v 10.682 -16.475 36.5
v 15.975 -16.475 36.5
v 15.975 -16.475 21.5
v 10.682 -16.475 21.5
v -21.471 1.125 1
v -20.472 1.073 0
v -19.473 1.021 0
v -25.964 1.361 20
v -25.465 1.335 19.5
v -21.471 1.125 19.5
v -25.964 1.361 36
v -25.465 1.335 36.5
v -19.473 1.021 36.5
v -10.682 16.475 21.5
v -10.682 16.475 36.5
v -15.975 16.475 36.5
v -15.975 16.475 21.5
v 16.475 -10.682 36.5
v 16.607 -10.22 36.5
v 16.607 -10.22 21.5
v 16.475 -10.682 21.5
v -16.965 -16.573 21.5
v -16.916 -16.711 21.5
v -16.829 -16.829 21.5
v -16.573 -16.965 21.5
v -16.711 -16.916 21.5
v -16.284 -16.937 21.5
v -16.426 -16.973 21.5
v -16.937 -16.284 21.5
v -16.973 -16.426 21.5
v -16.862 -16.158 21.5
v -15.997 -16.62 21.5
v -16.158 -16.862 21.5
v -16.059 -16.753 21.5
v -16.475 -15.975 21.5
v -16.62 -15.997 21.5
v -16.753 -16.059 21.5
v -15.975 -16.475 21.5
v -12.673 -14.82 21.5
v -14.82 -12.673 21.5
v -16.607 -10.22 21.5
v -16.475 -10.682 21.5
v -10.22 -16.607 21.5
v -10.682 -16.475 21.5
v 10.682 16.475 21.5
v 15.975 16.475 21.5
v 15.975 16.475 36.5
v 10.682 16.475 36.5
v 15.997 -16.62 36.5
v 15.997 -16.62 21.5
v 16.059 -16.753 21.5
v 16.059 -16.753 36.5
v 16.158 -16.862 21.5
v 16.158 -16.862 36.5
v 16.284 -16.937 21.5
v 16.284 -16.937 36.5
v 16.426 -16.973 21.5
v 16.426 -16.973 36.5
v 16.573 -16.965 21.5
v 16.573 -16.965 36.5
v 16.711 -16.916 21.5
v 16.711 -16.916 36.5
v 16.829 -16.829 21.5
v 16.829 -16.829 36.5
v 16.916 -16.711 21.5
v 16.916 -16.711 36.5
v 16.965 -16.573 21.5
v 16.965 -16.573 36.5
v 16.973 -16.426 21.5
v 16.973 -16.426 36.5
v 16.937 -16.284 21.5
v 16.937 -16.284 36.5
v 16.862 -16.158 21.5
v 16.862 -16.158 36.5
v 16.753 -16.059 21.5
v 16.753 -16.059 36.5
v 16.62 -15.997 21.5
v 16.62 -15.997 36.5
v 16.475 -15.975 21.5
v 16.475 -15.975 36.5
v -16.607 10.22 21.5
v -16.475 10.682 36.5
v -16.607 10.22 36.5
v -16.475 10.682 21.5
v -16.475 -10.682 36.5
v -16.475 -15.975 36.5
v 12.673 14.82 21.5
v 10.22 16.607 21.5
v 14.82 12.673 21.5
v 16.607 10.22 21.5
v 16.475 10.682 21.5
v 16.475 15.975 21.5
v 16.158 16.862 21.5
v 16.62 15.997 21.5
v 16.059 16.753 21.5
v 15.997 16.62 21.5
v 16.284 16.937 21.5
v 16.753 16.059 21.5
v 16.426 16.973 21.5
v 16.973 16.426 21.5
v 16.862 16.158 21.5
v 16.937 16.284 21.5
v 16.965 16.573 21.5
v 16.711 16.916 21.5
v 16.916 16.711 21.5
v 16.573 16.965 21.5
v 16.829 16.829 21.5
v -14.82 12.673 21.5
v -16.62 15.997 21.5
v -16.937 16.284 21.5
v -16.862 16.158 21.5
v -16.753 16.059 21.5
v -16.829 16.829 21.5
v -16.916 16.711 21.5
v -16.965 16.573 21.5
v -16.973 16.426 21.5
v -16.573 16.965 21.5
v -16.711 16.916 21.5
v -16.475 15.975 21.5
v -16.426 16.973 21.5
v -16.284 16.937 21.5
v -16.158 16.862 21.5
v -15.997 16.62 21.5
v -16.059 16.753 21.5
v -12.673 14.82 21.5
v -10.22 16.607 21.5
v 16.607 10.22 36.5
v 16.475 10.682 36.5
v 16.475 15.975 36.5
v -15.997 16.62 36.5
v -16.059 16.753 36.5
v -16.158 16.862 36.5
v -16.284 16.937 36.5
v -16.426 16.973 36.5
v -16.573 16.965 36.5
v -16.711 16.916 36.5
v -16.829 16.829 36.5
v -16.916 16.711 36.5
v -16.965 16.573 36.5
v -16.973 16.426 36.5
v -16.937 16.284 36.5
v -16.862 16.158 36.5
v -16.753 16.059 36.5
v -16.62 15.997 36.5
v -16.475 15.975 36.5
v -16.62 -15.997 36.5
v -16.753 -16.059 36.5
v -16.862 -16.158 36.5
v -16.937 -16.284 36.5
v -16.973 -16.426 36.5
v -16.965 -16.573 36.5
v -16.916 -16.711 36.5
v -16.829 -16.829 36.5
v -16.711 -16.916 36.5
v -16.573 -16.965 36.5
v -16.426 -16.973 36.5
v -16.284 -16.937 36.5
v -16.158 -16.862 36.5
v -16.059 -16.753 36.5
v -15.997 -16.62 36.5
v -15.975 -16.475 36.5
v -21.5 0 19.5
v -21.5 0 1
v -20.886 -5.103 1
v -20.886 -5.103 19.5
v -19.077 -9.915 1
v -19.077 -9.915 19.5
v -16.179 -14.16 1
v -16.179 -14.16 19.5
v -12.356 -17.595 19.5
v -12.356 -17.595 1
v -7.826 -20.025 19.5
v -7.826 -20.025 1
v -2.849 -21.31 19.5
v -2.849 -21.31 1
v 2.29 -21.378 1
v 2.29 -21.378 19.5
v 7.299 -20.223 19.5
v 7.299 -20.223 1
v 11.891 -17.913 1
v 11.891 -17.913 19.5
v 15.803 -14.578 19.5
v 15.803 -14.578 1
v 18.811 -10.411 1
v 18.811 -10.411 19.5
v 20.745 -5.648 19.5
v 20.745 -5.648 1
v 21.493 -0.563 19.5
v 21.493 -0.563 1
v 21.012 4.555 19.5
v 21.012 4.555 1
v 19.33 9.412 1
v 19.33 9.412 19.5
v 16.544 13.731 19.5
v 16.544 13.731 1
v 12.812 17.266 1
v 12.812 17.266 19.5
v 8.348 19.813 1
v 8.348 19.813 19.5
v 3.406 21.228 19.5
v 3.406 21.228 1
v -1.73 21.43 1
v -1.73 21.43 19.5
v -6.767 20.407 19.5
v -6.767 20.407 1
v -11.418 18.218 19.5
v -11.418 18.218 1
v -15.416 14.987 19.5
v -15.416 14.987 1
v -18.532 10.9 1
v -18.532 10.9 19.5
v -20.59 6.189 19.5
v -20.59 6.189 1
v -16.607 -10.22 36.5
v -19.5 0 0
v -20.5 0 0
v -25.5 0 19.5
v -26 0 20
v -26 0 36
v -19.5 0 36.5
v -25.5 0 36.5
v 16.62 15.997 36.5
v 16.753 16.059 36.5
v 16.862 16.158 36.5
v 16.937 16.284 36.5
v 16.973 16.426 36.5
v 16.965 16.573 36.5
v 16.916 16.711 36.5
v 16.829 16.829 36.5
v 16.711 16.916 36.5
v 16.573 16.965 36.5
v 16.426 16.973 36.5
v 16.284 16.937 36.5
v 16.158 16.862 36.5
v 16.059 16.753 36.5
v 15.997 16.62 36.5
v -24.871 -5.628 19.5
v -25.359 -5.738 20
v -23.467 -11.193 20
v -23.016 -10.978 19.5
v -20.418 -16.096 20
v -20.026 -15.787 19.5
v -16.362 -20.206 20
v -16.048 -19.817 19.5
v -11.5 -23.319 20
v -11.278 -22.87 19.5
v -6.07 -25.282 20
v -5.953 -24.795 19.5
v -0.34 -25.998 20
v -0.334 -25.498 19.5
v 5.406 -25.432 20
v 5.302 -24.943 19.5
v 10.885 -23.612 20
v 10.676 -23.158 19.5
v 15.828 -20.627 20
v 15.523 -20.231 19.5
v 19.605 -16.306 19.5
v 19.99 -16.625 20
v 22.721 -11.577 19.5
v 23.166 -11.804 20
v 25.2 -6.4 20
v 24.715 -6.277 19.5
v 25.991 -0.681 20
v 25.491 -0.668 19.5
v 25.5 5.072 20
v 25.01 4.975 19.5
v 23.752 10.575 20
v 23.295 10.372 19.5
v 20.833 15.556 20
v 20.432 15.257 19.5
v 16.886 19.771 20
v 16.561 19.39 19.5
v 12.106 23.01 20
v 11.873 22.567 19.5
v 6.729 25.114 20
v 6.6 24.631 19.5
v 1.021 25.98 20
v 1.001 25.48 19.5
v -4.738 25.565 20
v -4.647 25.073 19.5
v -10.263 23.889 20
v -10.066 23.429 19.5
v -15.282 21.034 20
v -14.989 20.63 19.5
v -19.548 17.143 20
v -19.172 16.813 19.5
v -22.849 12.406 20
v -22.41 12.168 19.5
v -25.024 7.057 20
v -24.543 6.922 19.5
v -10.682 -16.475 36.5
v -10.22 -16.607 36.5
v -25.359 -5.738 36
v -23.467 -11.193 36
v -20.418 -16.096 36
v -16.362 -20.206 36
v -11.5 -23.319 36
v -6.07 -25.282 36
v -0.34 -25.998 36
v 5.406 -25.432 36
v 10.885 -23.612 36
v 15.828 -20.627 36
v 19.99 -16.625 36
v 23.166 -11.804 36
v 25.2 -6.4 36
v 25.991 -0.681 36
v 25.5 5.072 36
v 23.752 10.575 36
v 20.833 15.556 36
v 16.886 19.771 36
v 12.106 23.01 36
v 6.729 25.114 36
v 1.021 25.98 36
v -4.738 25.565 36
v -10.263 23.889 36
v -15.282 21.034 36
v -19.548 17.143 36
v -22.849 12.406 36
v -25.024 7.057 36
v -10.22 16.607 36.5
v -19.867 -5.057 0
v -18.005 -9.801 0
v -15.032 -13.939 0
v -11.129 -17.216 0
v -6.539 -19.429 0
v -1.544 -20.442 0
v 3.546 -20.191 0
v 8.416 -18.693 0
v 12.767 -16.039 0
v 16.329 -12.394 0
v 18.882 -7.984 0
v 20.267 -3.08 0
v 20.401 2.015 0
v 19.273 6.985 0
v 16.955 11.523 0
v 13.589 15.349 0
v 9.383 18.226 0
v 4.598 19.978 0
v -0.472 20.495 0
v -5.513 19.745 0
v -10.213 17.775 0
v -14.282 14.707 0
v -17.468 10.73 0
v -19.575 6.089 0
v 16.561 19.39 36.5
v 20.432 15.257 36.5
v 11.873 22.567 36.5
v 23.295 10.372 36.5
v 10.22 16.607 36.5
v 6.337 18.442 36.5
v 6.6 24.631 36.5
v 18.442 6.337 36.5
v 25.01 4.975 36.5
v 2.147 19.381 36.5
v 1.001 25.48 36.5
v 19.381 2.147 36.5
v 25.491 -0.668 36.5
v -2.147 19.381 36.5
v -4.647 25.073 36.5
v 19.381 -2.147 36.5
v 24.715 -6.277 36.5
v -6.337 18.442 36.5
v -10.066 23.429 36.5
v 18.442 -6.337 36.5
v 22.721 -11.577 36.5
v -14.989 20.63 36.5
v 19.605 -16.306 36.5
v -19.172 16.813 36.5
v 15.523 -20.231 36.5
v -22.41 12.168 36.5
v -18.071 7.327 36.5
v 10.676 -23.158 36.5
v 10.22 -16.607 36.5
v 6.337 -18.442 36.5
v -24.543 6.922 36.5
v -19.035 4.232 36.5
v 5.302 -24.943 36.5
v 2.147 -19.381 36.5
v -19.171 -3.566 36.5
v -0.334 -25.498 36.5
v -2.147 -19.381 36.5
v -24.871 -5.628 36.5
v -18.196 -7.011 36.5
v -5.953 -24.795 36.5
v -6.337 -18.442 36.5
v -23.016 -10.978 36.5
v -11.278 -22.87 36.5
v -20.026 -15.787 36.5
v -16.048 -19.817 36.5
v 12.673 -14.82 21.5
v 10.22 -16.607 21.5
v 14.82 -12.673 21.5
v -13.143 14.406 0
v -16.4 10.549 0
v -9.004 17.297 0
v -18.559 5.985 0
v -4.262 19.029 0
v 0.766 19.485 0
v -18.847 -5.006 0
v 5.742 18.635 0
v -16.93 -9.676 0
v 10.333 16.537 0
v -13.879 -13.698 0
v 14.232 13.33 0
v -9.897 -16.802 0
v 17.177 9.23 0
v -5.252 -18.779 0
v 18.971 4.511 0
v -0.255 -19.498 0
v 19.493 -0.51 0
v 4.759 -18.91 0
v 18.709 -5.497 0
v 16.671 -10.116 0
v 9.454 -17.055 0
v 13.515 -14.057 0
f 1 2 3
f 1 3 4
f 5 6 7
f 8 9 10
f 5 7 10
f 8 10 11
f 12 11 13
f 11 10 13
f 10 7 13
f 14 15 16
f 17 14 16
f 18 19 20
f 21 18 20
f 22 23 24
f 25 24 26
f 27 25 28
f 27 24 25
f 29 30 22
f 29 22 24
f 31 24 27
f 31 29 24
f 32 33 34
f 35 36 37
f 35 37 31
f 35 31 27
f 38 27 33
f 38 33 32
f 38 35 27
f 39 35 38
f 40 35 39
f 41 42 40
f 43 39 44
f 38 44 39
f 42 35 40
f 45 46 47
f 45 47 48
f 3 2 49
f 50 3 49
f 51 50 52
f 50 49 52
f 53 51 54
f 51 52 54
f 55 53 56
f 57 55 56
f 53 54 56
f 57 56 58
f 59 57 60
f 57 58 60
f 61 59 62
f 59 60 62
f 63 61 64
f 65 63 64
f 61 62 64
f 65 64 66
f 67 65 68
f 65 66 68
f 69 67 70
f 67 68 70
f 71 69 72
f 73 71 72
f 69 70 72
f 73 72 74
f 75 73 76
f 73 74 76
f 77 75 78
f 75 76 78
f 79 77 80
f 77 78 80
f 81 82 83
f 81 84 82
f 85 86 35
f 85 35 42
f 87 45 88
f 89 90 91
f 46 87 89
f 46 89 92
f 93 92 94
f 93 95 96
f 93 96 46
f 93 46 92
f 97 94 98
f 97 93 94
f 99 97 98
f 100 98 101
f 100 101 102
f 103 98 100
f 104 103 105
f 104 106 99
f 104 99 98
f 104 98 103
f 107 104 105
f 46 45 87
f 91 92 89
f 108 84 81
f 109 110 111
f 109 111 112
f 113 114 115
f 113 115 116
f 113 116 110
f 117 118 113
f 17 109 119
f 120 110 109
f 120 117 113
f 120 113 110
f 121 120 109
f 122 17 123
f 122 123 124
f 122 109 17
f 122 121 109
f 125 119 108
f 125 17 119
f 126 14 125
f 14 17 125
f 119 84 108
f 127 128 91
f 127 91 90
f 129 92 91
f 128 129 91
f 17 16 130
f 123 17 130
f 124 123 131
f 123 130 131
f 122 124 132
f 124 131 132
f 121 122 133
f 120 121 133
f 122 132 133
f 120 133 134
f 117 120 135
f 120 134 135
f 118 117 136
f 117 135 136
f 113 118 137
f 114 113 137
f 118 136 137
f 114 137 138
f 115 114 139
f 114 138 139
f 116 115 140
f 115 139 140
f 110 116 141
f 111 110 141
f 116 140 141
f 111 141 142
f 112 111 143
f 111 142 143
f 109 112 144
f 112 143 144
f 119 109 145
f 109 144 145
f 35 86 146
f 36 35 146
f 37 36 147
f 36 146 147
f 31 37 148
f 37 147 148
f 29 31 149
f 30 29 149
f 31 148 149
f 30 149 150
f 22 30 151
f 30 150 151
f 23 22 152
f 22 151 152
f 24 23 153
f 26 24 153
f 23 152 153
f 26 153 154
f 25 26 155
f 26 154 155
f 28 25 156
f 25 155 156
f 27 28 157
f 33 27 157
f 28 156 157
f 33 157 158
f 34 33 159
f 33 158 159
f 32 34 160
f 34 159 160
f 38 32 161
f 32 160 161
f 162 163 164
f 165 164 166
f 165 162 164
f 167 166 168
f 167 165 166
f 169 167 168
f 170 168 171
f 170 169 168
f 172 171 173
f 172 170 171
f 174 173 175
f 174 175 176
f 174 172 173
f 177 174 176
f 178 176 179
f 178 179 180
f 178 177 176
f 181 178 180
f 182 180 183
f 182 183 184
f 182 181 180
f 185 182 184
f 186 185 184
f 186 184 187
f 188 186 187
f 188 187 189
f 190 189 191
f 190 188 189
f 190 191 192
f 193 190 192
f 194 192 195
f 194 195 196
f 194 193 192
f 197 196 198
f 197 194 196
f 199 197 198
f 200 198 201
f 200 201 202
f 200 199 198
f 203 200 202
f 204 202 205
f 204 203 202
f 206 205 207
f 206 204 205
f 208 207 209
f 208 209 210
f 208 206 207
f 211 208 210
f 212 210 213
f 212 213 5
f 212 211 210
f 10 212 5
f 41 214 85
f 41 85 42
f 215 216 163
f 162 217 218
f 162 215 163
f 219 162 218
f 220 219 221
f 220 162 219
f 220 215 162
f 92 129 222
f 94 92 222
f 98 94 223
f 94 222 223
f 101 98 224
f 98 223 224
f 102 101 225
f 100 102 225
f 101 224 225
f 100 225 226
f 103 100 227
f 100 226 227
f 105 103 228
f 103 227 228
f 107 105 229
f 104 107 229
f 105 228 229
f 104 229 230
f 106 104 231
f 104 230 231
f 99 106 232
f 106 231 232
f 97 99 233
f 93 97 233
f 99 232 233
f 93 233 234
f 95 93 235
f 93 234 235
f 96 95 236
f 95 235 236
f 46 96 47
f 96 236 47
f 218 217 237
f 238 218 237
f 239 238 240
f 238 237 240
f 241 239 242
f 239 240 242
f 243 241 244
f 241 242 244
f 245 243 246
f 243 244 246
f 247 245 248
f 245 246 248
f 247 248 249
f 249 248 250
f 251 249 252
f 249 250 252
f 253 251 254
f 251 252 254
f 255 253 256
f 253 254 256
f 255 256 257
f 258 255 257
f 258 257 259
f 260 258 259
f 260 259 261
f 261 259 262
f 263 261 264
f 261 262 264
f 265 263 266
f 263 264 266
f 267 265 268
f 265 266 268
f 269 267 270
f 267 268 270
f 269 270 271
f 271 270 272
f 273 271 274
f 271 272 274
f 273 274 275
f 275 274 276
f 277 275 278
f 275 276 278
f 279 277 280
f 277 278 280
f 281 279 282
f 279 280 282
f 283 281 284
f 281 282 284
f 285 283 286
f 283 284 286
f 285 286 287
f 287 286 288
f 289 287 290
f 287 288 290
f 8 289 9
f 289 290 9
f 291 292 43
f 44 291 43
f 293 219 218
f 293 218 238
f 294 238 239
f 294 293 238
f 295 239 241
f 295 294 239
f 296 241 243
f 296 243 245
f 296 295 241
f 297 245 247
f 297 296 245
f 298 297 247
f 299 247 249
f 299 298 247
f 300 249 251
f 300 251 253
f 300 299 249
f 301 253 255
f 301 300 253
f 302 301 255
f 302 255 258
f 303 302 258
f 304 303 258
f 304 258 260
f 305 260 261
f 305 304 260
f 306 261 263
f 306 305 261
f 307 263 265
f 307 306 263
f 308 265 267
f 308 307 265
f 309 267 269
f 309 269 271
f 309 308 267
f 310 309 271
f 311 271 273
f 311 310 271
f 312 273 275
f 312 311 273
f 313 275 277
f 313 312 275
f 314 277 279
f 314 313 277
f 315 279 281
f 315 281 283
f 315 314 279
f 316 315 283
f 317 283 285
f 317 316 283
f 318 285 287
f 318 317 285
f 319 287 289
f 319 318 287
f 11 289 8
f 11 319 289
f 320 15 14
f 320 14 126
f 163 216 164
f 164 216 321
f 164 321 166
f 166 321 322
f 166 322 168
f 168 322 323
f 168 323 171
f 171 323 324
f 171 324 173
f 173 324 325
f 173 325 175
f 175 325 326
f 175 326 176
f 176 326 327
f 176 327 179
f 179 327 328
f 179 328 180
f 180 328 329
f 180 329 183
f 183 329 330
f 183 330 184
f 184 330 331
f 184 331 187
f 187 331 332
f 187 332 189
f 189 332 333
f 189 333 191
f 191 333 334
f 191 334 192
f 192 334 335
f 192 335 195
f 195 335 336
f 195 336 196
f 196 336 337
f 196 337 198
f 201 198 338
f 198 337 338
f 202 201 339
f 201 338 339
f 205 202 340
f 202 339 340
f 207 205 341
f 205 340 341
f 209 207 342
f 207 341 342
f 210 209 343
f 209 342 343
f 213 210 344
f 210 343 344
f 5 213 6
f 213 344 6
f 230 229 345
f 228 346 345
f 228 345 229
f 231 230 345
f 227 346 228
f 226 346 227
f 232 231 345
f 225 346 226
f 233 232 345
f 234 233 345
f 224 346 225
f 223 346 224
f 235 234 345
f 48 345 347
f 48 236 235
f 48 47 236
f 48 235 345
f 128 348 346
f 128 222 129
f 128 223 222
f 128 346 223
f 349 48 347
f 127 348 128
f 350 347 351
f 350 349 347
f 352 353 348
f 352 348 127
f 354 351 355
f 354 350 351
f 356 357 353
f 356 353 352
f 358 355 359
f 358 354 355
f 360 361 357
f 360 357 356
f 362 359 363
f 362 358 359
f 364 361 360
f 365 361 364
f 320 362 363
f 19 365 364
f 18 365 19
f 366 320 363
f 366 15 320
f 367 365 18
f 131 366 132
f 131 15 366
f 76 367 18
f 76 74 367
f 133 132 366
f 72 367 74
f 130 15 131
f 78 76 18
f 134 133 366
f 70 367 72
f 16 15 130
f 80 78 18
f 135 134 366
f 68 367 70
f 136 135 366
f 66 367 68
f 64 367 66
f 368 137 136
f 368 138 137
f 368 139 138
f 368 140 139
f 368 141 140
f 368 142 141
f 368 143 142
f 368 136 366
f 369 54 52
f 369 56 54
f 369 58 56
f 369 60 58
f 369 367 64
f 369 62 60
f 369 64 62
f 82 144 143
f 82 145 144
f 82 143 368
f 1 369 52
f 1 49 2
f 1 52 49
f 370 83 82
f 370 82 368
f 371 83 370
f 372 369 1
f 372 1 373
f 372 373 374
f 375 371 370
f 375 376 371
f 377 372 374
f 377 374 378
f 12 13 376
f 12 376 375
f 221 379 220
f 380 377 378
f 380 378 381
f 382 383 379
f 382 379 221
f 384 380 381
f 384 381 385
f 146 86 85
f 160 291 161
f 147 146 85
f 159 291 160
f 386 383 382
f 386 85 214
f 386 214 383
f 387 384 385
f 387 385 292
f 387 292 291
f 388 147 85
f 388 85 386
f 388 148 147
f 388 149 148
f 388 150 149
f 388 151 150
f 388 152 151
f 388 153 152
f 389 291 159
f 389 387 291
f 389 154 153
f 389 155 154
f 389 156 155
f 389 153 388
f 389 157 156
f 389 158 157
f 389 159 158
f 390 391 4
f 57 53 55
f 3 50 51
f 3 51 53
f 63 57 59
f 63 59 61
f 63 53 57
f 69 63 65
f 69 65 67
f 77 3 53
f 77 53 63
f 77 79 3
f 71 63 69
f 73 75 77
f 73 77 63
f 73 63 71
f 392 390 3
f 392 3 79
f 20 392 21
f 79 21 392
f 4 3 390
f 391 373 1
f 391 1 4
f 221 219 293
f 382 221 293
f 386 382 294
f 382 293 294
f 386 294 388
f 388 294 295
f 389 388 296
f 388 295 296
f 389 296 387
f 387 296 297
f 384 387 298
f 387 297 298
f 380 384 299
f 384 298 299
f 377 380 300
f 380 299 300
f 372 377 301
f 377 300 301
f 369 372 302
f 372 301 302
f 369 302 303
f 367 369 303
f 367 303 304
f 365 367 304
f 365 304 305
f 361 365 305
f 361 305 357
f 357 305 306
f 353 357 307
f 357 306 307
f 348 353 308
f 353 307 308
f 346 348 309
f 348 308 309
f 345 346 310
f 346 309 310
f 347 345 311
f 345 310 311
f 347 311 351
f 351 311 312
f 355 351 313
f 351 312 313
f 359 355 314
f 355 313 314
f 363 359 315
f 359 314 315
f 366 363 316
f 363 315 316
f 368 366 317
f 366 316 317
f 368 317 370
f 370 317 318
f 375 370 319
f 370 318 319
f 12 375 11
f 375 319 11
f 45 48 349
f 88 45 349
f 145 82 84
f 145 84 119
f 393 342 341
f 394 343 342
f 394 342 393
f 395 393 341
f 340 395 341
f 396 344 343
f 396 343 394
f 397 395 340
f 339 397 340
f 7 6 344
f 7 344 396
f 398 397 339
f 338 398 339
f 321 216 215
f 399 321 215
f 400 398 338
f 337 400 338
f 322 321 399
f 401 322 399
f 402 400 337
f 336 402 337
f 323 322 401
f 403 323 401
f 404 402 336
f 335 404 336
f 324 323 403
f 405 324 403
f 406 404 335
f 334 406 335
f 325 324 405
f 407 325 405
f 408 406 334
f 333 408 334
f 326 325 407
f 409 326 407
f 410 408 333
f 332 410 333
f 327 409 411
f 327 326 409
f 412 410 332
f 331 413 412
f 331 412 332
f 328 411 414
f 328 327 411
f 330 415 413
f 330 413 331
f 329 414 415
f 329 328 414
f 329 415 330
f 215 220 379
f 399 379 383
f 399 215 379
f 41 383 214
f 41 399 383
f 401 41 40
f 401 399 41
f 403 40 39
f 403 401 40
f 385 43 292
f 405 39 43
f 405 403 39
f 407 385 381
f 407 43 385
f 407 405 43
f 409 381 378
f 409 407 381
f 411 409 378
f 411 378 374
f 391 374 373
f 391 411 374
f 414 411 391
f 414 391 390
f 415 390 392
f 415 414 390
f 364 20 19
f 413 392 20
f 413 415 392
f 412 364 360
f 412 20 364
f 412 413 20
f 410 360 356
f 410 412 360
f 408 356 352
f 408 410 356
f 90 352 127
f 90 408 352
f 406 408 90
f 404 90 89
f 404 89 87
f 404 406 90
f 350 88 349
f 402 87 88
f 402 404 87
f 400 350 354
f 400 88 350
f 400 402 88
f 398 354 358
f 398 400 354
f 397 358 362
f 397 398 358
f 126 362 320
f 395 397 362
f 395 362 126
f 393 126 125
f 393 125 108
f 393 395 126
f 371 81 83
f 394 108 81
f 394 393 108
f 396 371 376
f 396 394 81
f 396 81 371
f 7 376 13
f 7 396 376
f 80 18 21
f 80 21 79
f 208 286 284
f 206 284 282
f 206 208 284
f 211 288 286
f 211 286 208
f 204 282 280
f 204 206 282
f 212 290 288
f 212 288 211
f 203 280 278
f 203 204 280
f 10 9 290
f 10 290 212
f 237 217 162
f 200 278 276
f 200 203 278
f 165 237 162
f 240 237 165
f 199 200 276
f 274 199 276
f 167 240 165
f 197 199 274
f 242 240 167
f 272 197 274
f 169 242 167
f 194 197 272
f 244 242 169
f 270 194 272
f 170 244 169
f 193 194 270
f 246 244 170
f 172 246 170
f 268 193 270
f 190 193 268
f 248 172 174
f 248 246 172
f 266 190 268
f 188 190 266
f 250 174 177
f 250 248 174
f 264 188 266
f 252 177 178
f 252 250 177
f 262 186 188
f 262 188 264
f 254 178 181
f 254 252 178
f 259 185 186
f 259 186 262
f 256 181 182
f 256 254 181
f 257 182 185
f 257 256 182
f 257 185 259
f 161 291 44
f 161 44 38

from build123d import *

# Parameters (mm, degrees)
REVOLUTION_ANGLE = -357
SKETCH002_R      = 19.5
POCKET_DEPTH     = 36.501
POCKET001_DEPTH  = 15
CHAMFER_SIZE     = 0.25
CHAMFER001_SIZE  = 0.5
CHAMFER002_SIZE  = 0.5
CHAMFER003_SIZE  = 1


with BuildPart() as part:
    # Sketch → Revolution (revolve)
    with BuildSketch(Plane(origin=(0, 0, 0), x_dir=(0, 0, -1), z_dir=(0, -1, 0))):
        Polygon((-36.5, 0), (0, 0), (0, -21.5), (-19.5, -21.5), (-19.5, -26), (-36.5, -26), align=None)
    revolve(axis=Axis((0, 0, 0), (0, 0, -1)), revolution_arc=REVOLUTION_ANGLE)

    # Sketch002 → Pocket (cut, through all)
    with BuildSketch(Plane.XY):
        Circle(SKETCH002_R)
    extrude(amount=POCKET_DEPTH, mode=Mode.SUBTRACT)

    # Sketch001 → Pocket001 (cut)
    with BuildSketch(Plane.XY.offset(36.5)):
        with BuildLine():
            ThreePointArc((-15.975, 16.475), (-16.828553, 16.828553), (-16.475, 15.975))
            Line((-16.475, -15.975), (-16.475, 15.975))
            ThreePointArc((-16.475, -15.975), (-16.828553, -16.828553), (-15.975, -16.475))
            Line((15.975, -16.475), (-15.975, -16.475))
            ThreePointArc((15.975, -16.475), (16.828553, -16.828553), (16.475, -15.975))
            Line((16.475, 15.975), (16.475, -15.975))
            ThreePointArc((16.475, 15.975), (16.828553, 16.828553), (15.975, 16.475))
            Line((15.975, 16.475), (-15.975, 16.475))
        make_face()
    extrude(amount=-POCKET001_DEPTH, mode=Mode.SUBTRACT)

    # Chamfer
    chamfer_edges = [part.edges().sort_by_distance(p)[0] for p in [
        (-16.475, -10.431892, 29),
        (-10.431892, -16.475, 29),
        (10.431892, -16.475, 29),
        (16.475, -10.431892, 29),
        (-16.475, 10.431892, 29),
        (-10.431892, 16.475, 29),
        (10.431892, 16.475, 29),
        (16.475, 10.431892, 29),
    ]]
    chamfer(chamfer_edges, length=CHAMFER_SIZE)

    # Chamfer001
    chamfer001_edges = [part.edges().sort_by_distance(p)[0] for p in [
        (25.99109, -0.680601, 36.5),
    ]]
    chamfer(chamfer001_edges, length=CHAMFER001_SIZE)

    # Chamfer002
    chamfer002_edges = [part.edges().sort_by_distance(p)[0] for p in [
        (25.99109, -0.680601, 19.5),
    ]]
    chamfer(chamfer002_edges, length=CHAMFER002_SIZE)

    # Chamfer003
    chamfer003_edges = [part.edges().sort_by_distance(p)[0] for p in [
        (21.492632, -0.562804, 0),
    ]]
    chamfer(chamfer003_edges, length=CHAMFER003_SIZE)


solid = part.part
